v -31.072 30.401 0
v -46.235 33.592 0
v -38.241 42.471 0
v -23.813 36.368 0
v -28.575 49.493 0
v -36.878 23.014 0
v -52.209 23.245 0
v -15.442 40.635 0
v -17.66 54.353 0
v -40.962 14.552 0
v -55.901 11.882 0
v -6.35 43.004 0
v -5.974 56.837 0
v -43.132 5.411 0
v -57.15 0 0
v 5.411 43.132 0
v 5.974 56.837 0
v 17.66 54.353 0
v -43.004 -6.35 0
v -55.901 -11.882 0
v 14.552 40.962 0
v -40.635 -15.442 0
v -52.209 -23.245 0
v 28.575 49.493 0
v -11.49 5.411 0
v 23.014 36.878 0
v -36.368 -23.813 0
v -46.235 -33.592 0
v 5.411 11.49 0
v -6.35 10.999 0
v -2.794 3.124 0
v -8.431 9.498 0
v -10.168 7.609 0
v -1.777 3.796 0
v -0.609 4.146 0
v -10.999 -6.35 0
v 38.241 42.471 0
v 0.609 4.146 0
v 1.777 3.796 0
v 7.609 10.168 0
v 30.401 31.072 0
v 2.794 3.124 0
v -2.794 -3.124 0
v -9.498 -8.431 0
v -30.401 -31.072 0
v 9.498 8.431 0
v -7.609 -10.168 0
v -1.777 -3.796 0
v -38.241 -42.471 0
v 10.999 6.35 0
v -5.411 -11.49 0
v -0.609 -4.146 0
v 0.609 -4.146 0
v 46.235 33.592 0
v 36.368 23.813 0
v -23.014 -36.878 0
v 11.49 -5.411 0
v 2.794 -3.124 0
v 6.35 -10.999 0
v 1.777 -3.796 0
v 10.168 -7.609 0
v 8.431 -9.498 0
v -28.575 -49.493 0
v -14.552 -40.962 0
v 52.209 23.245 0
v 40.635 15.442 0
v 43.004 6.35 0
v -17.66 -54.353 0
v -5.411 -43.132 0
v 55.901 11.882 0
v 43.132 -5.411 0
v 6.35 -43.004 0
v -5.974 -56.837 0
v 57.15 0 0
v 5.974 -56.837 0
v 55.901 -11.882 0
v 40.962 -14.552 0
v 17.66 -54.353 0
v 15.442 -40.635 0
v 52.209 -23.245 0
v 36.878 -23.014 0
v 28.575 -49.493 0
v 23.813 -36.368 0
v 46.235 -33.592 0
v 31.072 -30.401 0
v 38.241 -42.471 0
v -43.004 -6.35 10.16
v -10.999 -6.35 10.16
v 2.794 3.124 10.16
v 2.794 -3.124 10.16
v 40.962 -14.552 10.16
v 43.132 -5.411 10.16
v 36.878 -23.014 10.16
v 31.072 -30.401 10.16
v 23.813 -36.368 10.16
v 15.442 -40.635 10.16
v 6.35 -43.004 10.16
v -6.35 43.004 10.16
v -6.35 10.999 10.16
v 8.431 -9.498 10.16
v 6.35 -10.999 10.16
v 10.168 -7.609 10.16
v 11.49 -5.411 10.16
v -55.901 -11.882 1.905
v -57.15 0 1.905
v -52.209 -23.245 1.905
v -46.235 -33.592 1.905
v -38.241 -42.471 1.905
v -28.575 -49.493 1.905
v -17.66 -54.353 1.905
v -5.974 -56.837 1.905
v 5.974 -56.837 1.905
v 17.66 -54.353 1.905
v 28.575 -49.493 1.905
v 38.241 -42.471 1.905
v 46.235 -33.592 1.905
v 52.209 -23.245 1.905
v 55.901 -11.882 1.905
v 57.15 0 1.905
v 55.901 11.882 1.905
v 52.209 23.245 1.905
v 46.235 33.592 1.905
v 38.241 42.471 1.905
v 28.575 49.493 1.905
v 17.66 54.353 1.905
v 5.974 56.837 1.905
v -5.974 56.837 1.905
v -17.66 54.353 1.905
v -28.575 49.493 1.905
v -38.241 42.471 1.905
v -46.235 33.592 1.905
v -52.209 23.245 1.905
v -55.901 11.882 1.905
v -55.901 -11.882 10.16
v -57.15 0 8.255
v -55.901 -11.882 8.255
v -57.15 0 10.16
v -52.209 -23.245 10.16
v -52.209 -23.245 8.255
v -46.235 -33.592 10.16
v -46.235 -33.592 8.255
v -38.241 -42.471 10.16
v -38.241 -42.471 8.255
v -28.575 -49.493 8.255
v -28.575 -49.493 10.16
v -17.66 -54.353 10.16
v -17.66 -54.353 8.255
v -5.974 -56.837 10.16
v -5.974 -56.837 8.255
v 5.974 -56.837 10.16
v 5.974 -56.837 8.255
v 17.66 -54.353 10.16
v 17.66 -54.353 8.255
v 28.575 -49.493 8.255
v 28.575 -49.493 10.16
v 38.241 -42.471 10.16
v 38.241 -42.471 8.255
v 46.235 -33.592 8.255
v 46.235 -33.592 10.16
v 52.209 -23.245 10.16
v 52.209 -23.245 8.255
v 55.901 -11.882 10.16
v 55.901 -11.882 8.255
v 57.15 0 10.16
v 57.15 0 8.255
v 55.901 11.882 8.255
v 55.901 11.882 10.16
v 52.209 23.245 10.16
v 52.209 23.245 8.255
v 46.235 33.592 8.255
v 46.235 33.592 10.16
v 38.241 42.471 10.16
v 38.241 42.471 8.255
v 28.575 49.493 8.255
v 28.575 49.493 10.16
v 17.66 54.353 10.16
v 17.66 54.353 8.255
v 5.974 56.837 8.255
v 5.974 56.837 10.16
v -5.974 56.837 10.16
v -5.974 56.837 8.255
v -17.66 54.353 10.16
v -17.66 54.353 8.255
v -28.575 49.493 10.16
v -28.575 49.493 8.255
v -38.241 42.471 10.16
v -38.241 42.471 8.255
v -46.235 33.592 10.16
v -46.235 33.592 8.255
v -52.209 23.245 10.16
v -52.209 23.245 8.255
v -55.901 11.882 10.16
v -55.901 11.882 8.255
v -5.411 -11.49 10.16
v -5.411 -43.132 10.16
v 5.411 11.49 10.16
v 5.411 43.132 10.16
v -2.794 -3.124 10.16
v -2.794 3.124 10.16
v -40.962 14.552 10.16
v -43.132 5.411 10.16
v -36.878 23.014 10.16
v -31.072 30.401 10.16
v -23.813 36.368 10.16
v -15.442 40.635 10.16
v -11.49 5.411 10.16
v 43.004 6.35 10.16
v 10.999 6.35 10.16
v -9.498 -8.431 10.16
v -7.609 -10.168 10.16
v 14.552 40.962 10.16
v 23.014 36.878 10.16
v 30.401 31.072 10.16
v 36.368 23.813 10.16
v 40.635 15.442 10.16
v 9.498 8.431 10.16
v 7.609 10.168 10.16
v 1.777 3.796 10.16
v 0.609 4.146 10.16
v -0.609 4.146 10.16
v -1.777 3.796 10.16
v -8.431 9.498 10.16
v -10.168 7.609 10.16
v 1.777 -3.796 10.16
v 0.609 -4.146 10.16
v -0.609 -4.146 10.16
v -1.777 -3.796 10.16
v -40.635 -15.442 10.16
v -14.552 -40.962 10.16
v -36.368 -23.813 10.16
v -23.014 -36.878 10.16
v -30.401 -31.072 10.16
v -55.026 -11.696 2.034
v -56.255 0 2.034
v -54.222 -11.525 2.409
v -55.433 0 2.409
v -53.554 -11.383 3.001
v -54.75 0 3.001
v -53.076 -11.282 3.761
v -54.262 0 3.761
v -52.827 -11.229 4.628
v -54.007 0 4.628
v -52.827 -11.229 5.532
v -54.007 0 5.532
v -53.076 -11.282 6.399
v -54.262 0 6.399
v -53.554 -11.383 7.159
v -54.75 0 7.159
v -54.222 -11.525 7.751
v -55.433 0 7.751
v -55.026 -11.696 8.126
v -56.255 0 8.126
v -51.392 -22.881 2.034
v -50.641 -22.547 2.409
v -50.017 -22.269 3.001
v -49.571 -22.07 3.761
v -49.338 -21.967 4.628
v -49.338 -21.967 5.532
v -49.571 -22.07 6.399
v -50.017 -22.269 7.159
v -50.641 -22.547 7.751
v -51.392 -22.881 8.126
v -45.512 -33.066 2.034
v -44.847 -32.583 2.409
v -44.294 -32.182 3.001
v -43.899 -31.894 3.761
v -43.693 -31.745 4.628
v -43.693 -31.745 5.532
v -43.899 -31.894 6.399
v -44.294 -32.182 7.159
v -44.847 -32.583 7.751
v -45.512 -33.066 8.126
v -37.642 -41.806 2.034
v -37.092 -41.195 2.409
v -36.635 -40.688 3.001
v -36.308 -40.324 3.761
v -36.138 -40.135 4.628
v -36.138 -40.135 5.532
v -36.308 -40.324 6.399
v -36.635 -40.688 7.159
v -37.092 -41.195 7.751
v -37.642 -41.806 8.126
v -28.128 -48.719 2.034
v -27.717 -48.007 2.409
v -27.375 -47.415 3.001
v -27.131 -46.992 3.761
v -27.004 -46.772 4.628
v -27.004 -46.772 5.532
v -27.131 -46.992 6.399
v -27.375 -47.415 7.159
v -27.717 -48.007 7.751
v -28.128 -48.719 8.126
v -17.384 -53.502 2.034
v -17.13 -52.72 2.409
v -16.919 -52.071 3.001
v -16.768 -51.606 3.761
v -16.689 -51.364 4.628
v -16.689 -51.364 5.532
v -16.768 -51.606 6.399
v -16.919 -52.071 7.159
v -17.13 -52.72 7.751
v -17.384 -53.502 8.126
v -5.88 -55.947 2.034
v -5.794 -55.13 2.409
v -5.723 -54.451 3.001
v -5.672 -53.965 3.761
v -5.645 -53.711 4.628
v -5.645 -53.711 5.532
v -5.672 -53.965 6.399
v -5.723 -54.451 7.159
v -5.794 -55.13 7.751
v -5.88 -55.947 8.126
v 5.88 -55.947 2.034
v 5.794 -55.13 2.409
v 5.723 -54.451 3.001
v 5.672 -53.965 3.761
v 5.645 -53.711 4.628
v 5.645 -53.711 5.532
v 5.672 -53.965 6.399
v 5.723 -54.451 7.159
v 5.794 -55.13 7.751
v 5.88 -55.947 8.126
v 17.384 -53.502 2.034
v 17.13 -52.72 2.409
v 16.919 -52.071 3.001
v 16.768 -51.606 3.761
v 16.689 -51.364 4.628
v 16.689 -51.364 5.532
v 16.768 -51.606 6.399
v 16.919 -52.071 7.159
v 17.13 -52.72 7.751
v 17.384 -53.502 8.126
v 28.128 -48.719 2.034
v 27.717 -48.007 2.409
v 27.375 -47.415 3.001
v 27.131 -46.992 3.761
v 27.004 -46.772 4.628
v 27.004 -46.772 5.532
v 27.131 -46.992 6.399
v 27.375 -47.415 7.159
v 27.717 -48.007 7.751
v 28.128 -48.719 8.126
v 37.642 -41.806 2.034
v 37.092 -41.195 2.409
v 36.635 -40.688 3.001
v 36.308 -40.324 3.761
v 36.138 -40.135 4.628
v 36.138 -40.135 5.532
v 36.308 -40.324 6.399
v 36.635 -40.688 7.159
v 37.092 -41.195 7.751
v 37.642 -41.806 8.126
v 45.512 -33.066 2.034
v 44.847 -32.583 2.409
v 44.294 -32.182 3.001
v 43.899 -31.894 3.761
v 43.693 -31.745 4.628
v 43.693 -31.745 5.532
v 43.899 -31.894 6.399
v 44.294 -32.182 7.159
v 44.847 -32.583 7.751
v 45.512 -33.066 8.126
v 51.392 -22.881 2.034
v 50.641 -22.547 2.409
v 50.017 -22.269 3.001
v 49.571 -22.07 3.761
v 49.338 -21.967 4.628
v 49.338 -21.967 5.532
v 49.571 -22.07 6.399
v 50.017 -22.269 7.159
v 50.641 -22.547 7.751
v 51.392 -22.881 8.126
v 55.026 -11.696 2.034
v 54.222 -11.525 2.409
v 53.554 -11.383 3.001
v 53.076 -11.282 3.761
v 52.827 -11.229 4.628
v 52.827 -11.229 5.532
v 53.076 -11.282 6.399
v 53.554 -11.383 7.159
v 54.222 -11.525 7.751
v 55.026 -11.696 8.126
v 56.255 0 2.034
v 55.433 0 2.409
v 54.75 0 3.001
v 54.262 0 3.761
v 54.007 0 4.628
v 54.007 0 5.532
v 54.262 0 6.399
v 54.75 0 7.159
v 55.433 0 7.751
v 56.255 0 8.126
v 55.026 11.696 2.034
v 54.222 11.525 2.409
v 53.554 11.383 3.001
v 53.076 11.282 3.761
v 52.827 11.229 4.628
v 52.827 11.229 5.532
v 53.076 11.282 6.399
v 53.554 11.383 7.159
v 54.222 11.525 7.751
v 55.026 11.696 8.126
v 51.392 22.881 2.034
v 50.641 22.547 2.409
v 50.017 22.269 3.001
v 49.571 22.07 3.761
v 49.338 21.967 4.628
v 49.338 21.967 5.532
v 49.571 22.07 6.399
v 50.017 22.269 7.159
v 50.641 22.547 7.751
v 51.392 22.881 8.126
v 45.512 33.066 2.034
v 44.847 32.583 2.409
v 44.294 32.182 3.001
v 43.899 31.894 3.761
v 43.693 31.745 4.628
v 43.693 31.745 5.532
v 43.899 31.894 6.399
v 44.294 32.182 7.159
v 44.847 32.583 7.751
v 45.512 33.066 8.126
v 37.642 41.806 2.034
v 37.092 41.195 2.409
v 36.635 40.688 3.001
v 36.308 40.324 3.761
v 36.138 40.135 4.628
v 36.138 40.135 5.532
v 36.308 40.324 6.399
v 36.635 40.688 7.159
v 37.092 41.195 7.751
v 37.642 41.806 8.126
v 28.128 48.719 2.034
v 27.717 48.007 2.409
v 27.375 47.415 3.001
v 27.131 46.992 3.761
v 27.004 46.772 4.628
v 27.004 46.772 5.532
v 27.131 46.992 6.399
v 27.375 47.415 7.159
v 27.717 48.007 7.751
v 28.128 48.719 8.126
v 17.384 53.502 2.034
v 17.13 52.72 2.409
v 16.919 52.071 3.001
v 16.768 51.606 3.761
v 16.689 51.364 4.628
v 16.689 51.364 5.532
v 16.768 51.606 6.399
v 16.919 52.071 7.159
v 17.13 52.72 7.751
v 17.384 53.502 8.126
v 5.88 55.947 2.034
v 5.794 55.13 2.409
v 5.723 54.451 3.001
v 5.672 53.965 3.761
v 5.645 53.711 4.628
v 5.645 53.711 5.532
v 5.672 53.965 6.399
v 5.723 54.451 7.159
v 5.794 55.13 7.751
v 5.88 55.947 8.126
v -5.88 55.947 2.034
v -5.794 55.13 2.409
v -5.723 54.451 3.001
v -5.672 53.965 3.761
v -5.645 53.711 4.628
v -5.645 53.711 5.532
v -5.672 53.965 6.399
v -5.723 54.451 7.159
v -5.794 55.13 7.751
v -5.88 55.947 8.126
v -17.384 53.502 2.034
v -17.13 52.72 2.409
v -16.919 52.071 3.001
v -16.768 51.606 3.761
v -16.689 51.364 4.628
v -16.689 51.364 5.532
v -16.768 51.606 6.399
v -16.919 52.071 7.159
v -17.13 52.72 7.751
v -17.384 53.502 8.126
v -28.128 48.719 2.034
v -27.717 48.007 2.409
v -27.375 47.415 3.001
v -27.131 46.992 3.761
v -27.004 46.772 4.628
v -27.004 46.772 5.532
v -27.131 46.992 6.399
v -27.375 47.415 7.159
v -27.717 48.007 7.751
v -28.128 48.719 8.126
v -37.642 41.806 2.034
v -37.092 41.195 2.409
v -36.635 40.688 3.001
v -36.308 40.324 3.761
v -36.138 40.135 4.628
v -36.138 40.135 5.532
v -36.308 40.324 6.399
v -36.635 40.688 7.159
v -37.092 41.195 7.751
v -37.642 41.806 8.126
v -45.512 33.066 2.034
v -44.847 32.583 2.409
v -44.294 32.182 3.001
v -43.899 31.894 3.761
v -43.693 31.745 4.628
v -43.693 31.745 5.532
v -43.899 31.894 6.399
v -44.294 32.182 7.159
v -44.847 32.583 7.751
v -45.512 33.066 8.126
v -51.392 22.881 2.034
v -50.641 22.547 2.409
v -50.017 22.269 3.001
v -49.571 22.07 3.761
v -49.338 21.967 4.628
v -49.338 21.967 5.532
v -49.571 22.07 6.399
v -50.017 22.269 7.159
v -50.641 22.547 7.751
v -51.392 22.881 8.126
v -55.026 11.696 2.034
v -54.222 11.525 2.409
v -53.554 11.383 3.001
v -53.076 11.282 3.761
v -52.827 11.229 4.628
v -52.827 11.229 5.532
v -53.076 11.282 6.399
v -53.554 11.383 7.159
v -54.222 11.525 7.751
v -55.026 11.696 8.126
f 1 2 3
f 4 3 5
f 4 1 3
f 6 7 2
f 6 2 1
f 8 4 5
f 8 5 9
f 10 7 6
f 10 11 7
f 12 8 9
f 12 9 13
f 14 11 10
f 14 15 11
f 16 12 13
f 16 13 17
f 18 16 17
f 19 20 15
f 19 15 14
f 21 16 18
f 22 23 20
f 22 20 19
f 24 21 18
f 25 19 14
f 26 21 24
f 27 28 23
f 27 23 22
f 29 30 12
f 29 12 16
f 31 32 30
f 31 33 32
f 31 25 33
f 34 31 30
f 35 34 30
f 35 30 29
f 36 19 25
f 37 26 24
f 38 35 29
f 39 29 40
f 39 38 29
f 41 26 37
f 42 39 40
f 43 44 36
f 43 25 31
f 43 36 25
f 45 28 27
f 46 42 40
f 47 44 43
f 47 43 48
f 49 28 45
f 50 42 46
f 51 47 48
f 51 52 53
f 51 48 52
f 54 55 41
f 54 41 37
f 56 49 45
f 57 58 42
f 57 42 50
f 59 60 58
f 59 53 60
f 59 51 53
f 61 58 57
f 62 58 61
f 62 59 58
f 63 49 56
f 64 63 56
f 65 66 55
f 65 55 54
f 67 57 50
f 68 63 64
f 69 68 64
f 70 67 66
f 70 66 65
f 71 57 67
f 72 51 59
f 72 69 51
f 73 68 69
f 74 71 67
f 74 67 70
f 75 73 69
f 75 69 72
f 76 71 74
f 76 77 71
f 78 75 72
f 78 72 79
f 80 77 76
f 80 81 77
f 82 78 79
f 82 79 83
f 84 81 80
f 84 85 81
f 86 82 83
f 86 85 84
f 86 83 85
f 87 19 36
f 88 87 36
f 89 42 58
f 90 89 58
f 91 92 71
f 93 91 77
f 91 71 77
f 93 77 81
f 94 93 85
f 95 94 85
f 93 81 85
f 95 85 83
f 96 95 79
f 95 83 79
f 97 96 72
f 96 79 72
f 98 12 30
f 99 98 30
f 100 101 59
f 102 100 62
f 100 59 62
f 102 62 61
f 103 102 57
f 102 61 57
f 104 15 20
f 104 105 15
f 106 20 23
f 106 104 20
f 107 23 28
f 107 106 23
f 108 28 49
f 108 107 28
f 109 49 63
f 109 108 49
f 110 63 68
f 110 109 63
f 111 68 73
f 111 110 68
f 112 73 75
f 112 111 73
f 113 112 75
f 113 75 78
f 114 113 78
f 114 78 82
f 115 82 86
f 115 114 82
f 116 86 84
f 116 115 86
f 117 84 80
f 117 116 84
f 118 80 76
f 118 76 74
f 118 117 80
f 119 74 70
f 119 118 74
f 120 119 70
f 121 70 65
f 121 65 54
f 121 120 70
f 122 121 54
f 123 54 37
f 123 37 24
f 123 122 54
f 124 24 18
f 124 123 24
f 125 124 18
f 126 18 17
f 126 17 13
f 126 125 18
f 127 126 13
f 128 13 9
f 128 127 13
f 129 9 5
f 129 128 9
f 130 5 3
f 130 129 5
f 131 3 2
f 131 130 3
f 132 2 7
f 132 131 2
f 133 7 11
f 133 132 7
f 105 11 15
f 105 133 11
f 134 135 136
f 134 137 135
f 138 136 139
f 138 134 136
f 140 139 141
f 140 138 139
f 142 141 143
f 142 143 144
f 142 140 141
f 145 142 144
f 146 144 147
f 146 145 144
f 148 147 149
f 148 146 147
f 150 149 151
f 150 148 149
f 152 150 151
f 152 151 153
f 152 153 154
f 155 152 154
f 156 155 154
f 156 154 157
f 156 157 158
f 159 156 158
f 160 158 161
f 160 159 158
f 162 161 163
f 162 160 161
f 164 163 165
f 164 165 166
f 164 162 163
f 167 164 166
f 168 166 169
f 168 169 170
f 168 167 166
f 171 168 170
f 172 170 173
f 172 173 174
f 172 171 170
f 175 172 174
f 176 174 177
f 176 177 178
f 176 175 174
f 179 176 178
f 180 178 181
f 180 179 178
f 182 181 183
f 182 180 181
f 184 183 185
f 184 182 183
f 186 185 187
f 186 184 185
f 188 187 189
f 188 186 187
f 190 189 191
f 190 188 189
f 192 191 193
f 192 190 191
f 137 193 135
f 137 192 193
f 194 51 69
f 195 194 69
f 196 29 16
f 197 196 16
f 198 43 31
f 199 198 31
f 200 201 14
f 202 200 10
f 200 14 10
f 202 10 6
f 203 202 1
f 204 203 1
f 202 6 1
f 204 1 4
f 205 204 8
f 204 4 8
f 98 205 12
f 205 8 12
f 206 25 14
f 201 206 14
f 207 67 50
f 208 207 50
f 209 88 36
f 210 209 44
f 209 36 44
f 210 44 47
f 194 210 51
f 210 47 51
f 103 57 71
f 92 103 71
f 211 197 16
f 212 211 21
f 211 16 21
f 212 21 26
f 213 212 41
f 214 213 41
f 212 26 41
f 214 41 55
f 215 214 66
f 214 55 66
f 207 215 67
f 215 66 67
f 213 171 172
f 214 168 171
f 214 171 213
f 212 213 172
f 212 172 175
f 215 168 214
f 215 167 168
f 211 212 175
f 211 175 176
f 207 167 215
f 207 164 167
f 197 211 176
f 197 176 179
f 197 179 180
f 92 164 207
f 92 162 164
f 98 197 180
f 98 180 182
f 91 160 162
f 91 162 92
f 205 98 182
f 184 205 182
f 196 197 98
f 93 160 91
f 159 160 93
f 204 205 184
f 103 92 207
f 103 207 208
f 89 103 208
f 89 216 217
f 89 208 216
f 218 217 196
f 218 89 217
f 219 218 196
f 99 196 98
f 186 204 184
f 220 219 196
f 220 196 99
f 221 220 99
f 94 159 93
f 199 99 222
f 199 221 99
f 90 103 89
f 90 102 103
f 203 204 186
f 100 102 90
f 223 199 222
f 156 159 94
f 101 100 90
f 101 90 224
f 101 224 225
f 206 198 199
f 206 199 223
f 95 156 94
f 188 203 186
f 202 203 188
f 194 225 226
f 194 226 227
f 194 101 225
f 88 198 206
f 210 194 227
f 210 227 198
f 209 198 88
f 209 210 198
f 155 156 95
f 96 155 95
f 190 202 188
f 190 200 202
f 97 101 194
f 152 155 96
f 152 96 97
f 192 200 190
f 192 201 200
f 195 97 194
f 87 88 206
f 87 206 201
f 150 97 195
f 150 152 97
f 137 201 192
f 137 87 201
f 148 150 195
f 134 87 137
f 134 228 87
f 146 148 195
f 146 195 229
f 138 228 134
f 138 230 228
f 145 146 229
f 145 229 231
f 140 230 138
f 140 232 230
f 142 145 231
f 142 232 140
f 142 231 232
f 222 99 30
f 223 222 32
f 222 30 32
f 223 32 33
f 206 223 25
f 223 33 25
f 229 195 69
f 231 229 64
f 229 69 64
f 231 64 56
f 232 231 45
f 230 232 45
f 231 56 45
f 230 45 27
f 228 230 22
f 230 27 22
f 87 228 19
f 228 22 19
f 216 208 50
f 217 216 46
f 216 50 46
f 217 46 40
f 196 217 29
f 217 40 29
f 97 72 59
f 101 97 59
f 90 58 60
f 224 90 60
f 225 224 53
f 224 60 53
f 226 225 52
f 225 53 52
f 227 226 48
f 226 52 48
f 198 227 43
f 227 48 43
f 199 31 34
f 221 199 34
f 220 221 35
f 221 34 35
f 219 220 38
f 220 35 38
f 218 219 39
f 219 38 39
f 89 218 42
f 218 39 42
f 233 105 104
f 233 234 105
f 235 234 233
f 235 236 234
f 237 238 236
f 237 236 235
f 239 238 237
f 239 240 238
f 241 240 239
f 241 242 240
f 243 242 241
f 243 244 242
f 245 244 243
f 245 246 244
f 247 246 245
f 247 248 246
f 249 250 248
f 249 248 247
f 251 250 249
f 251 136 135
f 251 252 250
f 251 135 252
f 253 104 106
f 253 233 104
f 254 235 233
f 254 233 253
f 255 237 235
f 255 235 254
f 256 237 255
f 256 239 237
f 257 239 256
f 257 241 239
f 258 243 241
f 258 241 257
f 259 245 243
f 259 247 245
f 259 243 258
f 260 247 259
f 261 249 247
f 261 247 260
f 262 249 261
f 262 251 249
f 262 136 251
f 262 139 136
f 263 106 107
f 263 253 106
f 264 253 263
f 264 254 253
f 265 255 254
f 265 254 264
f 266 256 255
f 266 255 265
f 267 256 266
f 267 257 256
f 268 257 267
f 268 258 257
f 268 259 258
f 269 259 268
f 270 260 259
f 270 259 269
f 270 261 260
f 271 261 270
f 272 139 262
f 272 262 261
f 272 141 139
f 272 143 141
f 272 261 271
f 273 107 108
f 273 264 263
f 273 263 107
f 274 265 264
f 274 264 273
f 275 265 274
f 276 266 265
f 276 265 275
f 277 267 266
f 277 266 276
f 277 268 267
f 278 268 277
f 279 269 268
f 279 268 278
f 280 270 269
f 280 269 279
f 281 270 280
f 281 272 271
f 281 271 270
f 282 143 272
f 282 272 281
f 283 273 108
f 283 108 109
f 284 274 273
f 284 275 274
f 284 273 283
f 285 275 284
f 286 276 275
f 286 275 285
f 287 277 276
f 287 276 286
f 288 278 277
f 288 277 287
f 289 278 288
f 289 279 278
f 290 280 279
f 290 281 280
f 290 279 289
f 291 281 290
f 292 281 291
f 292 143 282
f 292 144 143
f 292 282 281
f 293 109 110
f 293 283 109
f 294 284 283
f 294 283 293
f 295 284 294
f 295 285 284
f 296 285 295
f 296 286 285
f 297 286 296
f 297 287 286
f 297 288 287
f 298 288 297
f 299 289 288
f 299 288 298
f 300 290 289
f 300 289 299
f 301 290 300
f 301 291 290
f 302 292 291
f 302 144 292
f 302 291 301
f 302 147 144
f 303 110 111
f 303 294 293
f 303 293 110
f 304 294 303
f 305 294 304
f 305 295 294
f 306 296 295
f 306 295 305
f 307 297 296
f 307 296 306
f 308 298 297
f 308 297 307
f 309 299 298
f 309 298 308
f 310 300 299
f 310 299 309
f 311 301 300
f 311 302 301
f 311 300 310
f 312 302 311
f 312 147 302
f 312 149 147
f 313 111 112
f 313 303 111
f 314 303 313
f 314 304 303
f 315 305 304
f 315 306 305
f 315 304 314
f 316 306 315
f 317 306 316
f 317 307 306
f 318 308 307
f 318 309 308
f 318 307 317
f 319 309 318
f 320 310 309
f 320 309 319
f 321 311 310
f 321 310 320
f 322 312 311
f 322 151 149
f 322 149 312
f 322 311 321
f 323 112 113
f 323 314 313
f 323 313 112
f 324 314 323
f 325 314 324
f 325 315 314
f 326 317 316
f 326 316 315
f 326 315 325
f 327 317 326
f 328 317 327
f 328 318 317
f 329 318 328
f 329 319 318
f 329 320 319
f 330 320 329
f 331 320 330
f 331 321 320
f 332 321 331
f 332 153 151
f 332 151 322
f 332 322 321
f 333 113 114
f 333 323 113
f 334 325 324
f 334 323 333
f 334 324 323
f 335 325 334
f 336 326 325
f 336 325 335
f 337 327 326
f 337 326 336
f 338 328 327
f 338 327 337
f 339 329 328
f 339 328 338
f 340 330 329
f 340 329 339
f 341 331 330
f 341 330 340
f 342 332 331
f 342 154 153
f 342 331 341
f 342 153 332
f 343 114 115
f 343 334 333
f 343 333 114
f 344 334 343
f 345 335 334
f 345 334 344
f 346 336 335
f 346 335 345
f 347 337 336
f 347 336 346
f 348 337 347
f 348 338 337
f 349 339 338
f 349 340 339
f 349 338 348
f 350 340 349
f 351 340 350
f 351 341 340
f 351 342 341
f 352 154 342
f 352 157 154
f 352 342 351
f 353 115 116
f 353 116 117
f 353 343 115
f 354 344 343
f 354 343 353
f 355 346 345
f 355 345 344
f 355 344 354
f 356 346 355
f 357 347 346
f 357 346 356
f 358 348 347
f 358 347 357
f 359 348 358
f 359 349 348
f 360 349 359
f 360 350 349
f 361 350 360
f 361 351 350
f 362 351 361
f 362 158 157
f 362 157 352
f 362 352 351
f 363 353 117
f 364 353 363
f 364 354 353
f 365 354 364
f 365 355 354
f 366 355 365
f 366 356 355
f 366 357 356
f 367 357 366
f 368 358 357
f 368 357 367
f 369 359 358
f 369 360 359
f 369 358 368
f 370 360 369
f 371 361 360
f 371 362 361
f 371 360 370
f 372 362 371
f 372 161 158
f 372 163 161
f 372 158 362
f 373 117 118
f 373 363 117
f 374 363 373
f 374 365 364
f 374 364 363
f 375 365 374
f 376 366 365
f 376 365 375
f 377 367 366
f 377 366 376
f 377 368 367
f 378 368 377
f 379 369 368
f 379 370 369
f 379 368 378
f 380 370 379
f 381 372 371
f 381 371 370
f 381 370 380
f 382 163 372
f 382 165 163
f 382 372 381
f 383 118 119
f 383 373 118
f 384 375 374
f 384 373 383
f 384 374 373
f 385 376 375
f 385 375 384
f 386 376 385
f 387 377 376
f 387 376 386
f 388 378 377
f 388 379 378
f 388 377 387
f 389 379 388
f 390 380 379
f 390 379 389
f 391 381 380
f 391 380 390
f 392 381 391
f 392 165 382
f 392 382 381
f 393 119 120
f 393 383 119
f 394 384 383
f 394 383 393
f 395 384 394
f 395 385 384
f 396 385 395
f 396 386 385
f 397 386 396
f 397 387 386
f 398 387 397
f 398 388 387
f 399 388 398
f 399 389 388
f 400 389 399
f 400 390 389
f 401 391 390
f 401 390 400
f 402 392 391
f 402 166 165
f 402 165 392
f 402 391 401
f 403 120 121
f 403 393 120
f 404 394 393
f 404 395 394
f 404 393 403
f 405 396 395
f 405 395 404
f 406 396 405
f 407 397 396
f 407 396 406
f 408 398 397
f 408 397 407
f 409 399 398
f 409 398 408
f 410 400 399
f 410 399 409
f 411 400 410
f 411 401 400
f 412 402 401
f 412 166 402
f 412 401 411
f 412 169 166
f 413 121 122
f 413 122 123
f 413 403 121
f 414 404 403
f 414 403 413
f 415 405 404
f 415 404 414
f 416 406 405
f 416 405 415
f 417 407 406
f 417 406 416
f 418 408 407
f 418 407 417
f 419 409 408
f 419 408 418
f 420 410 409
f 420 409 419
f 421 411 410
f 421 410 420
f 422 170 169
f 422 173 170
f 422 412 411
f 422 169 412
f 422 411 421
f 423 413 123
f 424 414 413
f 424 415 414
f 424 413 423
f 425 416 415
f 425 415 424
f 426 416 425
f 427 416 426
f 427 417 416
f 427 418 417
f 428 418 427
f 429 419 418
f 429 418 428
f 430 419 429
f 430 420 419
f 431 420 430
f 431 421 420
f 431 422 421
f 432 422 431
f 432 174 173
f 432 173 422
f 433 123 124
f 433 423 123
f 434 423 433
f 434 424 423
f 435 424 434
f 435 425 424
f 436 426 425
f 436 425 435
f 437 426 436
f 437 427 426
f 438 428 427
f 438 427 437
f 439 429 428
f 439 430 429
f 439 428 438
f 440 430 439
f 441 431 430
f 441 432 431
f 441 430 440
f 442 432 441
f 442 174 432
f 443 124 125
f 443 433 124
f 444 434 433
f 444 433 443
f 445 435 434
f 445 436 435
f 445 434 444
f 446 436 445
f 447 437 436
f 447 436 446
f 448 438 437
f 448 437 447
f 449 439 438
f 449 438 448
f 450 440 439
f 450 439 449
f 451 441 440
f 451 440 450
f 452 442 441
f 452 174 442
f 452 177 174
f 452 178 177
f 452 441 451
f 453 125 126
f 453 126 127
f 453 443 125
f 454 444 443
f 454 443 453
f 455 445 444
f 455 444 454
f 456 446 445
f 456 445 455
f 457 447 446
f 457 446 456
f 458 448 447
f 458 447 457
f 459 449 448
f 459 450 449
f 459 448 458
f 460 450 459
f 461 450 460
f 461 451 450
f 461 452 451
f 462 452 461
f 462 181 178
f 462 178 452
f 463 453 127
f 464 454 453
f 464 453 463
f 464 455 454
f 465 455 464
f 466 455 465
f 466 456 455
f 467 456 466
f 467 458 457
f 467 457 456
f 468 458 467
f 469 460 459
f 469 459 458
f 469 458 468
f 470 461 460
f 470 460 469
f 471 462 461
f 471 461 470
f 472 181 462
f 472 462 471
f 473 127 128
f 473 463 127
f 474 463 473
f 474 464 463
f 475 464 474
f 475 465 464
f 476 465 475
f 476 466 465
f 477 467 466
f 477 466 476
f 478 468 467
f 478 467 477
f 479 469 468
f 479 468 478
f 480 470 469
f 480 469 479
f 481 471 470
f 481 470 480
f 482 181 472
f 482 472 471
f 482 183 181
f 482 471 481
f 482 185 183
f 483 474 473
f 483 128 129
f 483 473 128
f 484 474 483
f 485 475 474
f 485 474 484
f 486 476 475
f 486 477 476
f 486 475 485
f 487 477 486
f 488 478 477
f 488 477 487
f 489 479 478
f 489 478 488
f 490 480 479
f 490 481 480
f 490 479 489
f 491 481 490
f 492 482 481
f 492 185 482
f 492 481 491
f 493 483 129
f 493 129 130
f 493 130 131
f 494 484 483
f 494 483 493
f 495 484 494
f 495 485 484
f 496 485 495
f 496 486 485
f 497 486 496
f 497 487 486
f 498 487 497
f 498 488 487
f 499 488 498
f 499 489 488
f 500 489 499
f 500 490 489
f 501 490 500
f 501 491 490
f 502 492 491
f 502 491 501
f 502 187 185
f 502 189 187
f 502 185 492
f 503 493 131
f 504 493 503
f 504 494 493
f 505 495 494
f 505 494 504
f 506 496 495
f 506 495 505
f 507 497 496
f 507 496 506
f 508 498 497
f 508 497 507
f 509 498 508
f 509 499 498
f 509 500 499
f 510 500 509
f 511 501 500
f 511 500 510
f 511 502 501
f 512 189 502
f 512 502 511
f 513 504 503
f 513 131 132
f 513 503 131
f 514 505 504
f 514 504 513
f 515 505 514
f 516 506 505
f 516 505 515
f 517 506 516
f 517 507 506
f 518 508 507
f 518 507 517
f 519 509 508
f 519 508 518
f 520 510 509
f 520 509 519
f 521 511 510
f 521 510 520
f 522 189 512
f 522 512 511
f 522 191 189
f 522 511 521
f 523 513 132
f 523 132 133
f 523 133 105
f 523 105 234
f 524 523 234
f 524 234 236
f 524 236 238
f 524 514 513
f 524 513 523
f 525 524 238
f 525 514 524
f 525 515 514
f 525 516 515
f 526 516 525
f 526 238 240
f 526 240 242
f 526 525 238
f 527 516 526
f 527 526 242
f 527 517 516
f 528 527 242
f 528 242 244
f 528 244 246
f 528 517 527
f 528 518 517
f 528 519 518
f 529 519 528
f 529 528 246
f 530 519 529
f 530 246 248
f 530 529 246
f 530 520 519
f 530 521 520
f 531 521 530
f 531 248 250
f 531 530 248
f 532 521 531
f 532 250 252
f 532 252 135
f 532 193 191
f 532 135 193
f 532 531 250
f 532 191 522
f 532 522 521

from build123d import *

# Parameters (mm, degrees)
CUT_EXTRUDE2_DEPTH = 82.458397971
CUT_EXTRUDE3_DEPTH = 82.458397971


with BuildPart() as part:
    # Sketch1 → Revolve1 (revolve)
    with BuildSketch(Plane(origin=(0, 0, 0), x_dir=(1, 0, 0), z_dir=(0, 1, 0))):
        with BuildLine():
            Line((-57.15, 0), (-57.15, -1.905))
            ThreePointArc((-57.15, -1.905), (-53.975, -5.08), (-57.15, -8.255))
            Line((-57.15, -8.255), (-57.15, -10.16))
            Line((-57.15, -10.16), (0, -10.16))
            Line((0, -10.16), (0, 0))
            Line((0, 0), (-57.15, 0))
        make_face()
    revolve(axis=Axis((0, 0, 0), (0, 0, 1)))

    # Sketch3 → Cut-Extrude2 (cut, through all)
    with BuildSketch(Plane(origin=(0, 0, 0), x_dir=(-1, 0, 0), z_dir=(0, 0, -1))):
        with BuildLine():
            Line((6.35, 43.004116755), (6.35, 10.998522628))
            ThreePointArc((6.35, 10.998522628), (9.347244518, 8.597617108), (11.489808035, 5.410574028))
            Line((11.489808035, 5.410574028), (43.132380488, 5.410574028))
            ThreePointArc((43.132380488, 5.410574028), (31.071612581, 30.401175134), (6.35, 43.004116755))
        make_face()
        with BuildLine():
            Line((5.410574028, -11.489808035), (5.410574028, -43.132380488))
            ThreePointArc((5.410574028, -43.132380488), (30.401175134, -31.071612581), (43.004116755, -6.35))
            Line((43.004116755, -6.35), (10.998522628, -6.35))
            ThreePointArc((10.998522628, -6.35), (8.597617108, -9.347244518), (5.410574028, -11.489808035))
        make_face()
        with BuildLine():
            Line((-11.489808035, -5.410574028), (-43.132380488, -5.410574028))
            ThreePointArc((-43.132380488, -5.410574028), (-31.071612581, -30.401175134), (-6.35, -43.004116755))
            Line((-6.35, -43.004116755), (-6.35, -10.998522628))
            ThreePointArc((-6.35, -10.998522628), (-9.347244518, -8.597617108), (-11.489808035, -5.410574028))
        make_face()
        with BuildLine():
            Line((-5.410574028, 11.489808035), (-5.410574028, 43.132380488))
            ThreePointArc((-5.410574028, 43.132380488), (-30.401175134, 31.071612581), (-43.004116755, 6.35))
            Line((-43.004116755, 6.35), (-10.998522628, 6.35))
            ThreePointArc((-10.998522628, 6.35), (-8.597617108, 9.347244518), (-5.410574028, 11.489808035))
        make_face()
    extrude(amount=-CUT_EXTRUDE2_DEPTH, mode=Mode.SUBTRACT)

    # Sketch6 → Cut-Extrude3 (cut, through all)
    with BuildSketch(Plane(origin=(0, 0, 0), x_dir=(-1, 0, 0), z_dir=(0, 0, -1))):
        with BuildLine():
            Line((-2.794, 3.123786965), (-2.794, -3.123786965))
            ThreePointArc((-2.794, -3.123786965), (0, -4.191), (2.794, -3.123786965))
            Line((2.794, -3.123786965), (2.794, 3.123786965))
            ThreePointArc((2.794, 3.123786965), (0, 4.191), (-2.794, 3.123786965))
        make_face()
    extrude(amount=-CUT_EXTRUDE3_DEPTH, mode=Mode.SUBTRACT)


solid = part.part
